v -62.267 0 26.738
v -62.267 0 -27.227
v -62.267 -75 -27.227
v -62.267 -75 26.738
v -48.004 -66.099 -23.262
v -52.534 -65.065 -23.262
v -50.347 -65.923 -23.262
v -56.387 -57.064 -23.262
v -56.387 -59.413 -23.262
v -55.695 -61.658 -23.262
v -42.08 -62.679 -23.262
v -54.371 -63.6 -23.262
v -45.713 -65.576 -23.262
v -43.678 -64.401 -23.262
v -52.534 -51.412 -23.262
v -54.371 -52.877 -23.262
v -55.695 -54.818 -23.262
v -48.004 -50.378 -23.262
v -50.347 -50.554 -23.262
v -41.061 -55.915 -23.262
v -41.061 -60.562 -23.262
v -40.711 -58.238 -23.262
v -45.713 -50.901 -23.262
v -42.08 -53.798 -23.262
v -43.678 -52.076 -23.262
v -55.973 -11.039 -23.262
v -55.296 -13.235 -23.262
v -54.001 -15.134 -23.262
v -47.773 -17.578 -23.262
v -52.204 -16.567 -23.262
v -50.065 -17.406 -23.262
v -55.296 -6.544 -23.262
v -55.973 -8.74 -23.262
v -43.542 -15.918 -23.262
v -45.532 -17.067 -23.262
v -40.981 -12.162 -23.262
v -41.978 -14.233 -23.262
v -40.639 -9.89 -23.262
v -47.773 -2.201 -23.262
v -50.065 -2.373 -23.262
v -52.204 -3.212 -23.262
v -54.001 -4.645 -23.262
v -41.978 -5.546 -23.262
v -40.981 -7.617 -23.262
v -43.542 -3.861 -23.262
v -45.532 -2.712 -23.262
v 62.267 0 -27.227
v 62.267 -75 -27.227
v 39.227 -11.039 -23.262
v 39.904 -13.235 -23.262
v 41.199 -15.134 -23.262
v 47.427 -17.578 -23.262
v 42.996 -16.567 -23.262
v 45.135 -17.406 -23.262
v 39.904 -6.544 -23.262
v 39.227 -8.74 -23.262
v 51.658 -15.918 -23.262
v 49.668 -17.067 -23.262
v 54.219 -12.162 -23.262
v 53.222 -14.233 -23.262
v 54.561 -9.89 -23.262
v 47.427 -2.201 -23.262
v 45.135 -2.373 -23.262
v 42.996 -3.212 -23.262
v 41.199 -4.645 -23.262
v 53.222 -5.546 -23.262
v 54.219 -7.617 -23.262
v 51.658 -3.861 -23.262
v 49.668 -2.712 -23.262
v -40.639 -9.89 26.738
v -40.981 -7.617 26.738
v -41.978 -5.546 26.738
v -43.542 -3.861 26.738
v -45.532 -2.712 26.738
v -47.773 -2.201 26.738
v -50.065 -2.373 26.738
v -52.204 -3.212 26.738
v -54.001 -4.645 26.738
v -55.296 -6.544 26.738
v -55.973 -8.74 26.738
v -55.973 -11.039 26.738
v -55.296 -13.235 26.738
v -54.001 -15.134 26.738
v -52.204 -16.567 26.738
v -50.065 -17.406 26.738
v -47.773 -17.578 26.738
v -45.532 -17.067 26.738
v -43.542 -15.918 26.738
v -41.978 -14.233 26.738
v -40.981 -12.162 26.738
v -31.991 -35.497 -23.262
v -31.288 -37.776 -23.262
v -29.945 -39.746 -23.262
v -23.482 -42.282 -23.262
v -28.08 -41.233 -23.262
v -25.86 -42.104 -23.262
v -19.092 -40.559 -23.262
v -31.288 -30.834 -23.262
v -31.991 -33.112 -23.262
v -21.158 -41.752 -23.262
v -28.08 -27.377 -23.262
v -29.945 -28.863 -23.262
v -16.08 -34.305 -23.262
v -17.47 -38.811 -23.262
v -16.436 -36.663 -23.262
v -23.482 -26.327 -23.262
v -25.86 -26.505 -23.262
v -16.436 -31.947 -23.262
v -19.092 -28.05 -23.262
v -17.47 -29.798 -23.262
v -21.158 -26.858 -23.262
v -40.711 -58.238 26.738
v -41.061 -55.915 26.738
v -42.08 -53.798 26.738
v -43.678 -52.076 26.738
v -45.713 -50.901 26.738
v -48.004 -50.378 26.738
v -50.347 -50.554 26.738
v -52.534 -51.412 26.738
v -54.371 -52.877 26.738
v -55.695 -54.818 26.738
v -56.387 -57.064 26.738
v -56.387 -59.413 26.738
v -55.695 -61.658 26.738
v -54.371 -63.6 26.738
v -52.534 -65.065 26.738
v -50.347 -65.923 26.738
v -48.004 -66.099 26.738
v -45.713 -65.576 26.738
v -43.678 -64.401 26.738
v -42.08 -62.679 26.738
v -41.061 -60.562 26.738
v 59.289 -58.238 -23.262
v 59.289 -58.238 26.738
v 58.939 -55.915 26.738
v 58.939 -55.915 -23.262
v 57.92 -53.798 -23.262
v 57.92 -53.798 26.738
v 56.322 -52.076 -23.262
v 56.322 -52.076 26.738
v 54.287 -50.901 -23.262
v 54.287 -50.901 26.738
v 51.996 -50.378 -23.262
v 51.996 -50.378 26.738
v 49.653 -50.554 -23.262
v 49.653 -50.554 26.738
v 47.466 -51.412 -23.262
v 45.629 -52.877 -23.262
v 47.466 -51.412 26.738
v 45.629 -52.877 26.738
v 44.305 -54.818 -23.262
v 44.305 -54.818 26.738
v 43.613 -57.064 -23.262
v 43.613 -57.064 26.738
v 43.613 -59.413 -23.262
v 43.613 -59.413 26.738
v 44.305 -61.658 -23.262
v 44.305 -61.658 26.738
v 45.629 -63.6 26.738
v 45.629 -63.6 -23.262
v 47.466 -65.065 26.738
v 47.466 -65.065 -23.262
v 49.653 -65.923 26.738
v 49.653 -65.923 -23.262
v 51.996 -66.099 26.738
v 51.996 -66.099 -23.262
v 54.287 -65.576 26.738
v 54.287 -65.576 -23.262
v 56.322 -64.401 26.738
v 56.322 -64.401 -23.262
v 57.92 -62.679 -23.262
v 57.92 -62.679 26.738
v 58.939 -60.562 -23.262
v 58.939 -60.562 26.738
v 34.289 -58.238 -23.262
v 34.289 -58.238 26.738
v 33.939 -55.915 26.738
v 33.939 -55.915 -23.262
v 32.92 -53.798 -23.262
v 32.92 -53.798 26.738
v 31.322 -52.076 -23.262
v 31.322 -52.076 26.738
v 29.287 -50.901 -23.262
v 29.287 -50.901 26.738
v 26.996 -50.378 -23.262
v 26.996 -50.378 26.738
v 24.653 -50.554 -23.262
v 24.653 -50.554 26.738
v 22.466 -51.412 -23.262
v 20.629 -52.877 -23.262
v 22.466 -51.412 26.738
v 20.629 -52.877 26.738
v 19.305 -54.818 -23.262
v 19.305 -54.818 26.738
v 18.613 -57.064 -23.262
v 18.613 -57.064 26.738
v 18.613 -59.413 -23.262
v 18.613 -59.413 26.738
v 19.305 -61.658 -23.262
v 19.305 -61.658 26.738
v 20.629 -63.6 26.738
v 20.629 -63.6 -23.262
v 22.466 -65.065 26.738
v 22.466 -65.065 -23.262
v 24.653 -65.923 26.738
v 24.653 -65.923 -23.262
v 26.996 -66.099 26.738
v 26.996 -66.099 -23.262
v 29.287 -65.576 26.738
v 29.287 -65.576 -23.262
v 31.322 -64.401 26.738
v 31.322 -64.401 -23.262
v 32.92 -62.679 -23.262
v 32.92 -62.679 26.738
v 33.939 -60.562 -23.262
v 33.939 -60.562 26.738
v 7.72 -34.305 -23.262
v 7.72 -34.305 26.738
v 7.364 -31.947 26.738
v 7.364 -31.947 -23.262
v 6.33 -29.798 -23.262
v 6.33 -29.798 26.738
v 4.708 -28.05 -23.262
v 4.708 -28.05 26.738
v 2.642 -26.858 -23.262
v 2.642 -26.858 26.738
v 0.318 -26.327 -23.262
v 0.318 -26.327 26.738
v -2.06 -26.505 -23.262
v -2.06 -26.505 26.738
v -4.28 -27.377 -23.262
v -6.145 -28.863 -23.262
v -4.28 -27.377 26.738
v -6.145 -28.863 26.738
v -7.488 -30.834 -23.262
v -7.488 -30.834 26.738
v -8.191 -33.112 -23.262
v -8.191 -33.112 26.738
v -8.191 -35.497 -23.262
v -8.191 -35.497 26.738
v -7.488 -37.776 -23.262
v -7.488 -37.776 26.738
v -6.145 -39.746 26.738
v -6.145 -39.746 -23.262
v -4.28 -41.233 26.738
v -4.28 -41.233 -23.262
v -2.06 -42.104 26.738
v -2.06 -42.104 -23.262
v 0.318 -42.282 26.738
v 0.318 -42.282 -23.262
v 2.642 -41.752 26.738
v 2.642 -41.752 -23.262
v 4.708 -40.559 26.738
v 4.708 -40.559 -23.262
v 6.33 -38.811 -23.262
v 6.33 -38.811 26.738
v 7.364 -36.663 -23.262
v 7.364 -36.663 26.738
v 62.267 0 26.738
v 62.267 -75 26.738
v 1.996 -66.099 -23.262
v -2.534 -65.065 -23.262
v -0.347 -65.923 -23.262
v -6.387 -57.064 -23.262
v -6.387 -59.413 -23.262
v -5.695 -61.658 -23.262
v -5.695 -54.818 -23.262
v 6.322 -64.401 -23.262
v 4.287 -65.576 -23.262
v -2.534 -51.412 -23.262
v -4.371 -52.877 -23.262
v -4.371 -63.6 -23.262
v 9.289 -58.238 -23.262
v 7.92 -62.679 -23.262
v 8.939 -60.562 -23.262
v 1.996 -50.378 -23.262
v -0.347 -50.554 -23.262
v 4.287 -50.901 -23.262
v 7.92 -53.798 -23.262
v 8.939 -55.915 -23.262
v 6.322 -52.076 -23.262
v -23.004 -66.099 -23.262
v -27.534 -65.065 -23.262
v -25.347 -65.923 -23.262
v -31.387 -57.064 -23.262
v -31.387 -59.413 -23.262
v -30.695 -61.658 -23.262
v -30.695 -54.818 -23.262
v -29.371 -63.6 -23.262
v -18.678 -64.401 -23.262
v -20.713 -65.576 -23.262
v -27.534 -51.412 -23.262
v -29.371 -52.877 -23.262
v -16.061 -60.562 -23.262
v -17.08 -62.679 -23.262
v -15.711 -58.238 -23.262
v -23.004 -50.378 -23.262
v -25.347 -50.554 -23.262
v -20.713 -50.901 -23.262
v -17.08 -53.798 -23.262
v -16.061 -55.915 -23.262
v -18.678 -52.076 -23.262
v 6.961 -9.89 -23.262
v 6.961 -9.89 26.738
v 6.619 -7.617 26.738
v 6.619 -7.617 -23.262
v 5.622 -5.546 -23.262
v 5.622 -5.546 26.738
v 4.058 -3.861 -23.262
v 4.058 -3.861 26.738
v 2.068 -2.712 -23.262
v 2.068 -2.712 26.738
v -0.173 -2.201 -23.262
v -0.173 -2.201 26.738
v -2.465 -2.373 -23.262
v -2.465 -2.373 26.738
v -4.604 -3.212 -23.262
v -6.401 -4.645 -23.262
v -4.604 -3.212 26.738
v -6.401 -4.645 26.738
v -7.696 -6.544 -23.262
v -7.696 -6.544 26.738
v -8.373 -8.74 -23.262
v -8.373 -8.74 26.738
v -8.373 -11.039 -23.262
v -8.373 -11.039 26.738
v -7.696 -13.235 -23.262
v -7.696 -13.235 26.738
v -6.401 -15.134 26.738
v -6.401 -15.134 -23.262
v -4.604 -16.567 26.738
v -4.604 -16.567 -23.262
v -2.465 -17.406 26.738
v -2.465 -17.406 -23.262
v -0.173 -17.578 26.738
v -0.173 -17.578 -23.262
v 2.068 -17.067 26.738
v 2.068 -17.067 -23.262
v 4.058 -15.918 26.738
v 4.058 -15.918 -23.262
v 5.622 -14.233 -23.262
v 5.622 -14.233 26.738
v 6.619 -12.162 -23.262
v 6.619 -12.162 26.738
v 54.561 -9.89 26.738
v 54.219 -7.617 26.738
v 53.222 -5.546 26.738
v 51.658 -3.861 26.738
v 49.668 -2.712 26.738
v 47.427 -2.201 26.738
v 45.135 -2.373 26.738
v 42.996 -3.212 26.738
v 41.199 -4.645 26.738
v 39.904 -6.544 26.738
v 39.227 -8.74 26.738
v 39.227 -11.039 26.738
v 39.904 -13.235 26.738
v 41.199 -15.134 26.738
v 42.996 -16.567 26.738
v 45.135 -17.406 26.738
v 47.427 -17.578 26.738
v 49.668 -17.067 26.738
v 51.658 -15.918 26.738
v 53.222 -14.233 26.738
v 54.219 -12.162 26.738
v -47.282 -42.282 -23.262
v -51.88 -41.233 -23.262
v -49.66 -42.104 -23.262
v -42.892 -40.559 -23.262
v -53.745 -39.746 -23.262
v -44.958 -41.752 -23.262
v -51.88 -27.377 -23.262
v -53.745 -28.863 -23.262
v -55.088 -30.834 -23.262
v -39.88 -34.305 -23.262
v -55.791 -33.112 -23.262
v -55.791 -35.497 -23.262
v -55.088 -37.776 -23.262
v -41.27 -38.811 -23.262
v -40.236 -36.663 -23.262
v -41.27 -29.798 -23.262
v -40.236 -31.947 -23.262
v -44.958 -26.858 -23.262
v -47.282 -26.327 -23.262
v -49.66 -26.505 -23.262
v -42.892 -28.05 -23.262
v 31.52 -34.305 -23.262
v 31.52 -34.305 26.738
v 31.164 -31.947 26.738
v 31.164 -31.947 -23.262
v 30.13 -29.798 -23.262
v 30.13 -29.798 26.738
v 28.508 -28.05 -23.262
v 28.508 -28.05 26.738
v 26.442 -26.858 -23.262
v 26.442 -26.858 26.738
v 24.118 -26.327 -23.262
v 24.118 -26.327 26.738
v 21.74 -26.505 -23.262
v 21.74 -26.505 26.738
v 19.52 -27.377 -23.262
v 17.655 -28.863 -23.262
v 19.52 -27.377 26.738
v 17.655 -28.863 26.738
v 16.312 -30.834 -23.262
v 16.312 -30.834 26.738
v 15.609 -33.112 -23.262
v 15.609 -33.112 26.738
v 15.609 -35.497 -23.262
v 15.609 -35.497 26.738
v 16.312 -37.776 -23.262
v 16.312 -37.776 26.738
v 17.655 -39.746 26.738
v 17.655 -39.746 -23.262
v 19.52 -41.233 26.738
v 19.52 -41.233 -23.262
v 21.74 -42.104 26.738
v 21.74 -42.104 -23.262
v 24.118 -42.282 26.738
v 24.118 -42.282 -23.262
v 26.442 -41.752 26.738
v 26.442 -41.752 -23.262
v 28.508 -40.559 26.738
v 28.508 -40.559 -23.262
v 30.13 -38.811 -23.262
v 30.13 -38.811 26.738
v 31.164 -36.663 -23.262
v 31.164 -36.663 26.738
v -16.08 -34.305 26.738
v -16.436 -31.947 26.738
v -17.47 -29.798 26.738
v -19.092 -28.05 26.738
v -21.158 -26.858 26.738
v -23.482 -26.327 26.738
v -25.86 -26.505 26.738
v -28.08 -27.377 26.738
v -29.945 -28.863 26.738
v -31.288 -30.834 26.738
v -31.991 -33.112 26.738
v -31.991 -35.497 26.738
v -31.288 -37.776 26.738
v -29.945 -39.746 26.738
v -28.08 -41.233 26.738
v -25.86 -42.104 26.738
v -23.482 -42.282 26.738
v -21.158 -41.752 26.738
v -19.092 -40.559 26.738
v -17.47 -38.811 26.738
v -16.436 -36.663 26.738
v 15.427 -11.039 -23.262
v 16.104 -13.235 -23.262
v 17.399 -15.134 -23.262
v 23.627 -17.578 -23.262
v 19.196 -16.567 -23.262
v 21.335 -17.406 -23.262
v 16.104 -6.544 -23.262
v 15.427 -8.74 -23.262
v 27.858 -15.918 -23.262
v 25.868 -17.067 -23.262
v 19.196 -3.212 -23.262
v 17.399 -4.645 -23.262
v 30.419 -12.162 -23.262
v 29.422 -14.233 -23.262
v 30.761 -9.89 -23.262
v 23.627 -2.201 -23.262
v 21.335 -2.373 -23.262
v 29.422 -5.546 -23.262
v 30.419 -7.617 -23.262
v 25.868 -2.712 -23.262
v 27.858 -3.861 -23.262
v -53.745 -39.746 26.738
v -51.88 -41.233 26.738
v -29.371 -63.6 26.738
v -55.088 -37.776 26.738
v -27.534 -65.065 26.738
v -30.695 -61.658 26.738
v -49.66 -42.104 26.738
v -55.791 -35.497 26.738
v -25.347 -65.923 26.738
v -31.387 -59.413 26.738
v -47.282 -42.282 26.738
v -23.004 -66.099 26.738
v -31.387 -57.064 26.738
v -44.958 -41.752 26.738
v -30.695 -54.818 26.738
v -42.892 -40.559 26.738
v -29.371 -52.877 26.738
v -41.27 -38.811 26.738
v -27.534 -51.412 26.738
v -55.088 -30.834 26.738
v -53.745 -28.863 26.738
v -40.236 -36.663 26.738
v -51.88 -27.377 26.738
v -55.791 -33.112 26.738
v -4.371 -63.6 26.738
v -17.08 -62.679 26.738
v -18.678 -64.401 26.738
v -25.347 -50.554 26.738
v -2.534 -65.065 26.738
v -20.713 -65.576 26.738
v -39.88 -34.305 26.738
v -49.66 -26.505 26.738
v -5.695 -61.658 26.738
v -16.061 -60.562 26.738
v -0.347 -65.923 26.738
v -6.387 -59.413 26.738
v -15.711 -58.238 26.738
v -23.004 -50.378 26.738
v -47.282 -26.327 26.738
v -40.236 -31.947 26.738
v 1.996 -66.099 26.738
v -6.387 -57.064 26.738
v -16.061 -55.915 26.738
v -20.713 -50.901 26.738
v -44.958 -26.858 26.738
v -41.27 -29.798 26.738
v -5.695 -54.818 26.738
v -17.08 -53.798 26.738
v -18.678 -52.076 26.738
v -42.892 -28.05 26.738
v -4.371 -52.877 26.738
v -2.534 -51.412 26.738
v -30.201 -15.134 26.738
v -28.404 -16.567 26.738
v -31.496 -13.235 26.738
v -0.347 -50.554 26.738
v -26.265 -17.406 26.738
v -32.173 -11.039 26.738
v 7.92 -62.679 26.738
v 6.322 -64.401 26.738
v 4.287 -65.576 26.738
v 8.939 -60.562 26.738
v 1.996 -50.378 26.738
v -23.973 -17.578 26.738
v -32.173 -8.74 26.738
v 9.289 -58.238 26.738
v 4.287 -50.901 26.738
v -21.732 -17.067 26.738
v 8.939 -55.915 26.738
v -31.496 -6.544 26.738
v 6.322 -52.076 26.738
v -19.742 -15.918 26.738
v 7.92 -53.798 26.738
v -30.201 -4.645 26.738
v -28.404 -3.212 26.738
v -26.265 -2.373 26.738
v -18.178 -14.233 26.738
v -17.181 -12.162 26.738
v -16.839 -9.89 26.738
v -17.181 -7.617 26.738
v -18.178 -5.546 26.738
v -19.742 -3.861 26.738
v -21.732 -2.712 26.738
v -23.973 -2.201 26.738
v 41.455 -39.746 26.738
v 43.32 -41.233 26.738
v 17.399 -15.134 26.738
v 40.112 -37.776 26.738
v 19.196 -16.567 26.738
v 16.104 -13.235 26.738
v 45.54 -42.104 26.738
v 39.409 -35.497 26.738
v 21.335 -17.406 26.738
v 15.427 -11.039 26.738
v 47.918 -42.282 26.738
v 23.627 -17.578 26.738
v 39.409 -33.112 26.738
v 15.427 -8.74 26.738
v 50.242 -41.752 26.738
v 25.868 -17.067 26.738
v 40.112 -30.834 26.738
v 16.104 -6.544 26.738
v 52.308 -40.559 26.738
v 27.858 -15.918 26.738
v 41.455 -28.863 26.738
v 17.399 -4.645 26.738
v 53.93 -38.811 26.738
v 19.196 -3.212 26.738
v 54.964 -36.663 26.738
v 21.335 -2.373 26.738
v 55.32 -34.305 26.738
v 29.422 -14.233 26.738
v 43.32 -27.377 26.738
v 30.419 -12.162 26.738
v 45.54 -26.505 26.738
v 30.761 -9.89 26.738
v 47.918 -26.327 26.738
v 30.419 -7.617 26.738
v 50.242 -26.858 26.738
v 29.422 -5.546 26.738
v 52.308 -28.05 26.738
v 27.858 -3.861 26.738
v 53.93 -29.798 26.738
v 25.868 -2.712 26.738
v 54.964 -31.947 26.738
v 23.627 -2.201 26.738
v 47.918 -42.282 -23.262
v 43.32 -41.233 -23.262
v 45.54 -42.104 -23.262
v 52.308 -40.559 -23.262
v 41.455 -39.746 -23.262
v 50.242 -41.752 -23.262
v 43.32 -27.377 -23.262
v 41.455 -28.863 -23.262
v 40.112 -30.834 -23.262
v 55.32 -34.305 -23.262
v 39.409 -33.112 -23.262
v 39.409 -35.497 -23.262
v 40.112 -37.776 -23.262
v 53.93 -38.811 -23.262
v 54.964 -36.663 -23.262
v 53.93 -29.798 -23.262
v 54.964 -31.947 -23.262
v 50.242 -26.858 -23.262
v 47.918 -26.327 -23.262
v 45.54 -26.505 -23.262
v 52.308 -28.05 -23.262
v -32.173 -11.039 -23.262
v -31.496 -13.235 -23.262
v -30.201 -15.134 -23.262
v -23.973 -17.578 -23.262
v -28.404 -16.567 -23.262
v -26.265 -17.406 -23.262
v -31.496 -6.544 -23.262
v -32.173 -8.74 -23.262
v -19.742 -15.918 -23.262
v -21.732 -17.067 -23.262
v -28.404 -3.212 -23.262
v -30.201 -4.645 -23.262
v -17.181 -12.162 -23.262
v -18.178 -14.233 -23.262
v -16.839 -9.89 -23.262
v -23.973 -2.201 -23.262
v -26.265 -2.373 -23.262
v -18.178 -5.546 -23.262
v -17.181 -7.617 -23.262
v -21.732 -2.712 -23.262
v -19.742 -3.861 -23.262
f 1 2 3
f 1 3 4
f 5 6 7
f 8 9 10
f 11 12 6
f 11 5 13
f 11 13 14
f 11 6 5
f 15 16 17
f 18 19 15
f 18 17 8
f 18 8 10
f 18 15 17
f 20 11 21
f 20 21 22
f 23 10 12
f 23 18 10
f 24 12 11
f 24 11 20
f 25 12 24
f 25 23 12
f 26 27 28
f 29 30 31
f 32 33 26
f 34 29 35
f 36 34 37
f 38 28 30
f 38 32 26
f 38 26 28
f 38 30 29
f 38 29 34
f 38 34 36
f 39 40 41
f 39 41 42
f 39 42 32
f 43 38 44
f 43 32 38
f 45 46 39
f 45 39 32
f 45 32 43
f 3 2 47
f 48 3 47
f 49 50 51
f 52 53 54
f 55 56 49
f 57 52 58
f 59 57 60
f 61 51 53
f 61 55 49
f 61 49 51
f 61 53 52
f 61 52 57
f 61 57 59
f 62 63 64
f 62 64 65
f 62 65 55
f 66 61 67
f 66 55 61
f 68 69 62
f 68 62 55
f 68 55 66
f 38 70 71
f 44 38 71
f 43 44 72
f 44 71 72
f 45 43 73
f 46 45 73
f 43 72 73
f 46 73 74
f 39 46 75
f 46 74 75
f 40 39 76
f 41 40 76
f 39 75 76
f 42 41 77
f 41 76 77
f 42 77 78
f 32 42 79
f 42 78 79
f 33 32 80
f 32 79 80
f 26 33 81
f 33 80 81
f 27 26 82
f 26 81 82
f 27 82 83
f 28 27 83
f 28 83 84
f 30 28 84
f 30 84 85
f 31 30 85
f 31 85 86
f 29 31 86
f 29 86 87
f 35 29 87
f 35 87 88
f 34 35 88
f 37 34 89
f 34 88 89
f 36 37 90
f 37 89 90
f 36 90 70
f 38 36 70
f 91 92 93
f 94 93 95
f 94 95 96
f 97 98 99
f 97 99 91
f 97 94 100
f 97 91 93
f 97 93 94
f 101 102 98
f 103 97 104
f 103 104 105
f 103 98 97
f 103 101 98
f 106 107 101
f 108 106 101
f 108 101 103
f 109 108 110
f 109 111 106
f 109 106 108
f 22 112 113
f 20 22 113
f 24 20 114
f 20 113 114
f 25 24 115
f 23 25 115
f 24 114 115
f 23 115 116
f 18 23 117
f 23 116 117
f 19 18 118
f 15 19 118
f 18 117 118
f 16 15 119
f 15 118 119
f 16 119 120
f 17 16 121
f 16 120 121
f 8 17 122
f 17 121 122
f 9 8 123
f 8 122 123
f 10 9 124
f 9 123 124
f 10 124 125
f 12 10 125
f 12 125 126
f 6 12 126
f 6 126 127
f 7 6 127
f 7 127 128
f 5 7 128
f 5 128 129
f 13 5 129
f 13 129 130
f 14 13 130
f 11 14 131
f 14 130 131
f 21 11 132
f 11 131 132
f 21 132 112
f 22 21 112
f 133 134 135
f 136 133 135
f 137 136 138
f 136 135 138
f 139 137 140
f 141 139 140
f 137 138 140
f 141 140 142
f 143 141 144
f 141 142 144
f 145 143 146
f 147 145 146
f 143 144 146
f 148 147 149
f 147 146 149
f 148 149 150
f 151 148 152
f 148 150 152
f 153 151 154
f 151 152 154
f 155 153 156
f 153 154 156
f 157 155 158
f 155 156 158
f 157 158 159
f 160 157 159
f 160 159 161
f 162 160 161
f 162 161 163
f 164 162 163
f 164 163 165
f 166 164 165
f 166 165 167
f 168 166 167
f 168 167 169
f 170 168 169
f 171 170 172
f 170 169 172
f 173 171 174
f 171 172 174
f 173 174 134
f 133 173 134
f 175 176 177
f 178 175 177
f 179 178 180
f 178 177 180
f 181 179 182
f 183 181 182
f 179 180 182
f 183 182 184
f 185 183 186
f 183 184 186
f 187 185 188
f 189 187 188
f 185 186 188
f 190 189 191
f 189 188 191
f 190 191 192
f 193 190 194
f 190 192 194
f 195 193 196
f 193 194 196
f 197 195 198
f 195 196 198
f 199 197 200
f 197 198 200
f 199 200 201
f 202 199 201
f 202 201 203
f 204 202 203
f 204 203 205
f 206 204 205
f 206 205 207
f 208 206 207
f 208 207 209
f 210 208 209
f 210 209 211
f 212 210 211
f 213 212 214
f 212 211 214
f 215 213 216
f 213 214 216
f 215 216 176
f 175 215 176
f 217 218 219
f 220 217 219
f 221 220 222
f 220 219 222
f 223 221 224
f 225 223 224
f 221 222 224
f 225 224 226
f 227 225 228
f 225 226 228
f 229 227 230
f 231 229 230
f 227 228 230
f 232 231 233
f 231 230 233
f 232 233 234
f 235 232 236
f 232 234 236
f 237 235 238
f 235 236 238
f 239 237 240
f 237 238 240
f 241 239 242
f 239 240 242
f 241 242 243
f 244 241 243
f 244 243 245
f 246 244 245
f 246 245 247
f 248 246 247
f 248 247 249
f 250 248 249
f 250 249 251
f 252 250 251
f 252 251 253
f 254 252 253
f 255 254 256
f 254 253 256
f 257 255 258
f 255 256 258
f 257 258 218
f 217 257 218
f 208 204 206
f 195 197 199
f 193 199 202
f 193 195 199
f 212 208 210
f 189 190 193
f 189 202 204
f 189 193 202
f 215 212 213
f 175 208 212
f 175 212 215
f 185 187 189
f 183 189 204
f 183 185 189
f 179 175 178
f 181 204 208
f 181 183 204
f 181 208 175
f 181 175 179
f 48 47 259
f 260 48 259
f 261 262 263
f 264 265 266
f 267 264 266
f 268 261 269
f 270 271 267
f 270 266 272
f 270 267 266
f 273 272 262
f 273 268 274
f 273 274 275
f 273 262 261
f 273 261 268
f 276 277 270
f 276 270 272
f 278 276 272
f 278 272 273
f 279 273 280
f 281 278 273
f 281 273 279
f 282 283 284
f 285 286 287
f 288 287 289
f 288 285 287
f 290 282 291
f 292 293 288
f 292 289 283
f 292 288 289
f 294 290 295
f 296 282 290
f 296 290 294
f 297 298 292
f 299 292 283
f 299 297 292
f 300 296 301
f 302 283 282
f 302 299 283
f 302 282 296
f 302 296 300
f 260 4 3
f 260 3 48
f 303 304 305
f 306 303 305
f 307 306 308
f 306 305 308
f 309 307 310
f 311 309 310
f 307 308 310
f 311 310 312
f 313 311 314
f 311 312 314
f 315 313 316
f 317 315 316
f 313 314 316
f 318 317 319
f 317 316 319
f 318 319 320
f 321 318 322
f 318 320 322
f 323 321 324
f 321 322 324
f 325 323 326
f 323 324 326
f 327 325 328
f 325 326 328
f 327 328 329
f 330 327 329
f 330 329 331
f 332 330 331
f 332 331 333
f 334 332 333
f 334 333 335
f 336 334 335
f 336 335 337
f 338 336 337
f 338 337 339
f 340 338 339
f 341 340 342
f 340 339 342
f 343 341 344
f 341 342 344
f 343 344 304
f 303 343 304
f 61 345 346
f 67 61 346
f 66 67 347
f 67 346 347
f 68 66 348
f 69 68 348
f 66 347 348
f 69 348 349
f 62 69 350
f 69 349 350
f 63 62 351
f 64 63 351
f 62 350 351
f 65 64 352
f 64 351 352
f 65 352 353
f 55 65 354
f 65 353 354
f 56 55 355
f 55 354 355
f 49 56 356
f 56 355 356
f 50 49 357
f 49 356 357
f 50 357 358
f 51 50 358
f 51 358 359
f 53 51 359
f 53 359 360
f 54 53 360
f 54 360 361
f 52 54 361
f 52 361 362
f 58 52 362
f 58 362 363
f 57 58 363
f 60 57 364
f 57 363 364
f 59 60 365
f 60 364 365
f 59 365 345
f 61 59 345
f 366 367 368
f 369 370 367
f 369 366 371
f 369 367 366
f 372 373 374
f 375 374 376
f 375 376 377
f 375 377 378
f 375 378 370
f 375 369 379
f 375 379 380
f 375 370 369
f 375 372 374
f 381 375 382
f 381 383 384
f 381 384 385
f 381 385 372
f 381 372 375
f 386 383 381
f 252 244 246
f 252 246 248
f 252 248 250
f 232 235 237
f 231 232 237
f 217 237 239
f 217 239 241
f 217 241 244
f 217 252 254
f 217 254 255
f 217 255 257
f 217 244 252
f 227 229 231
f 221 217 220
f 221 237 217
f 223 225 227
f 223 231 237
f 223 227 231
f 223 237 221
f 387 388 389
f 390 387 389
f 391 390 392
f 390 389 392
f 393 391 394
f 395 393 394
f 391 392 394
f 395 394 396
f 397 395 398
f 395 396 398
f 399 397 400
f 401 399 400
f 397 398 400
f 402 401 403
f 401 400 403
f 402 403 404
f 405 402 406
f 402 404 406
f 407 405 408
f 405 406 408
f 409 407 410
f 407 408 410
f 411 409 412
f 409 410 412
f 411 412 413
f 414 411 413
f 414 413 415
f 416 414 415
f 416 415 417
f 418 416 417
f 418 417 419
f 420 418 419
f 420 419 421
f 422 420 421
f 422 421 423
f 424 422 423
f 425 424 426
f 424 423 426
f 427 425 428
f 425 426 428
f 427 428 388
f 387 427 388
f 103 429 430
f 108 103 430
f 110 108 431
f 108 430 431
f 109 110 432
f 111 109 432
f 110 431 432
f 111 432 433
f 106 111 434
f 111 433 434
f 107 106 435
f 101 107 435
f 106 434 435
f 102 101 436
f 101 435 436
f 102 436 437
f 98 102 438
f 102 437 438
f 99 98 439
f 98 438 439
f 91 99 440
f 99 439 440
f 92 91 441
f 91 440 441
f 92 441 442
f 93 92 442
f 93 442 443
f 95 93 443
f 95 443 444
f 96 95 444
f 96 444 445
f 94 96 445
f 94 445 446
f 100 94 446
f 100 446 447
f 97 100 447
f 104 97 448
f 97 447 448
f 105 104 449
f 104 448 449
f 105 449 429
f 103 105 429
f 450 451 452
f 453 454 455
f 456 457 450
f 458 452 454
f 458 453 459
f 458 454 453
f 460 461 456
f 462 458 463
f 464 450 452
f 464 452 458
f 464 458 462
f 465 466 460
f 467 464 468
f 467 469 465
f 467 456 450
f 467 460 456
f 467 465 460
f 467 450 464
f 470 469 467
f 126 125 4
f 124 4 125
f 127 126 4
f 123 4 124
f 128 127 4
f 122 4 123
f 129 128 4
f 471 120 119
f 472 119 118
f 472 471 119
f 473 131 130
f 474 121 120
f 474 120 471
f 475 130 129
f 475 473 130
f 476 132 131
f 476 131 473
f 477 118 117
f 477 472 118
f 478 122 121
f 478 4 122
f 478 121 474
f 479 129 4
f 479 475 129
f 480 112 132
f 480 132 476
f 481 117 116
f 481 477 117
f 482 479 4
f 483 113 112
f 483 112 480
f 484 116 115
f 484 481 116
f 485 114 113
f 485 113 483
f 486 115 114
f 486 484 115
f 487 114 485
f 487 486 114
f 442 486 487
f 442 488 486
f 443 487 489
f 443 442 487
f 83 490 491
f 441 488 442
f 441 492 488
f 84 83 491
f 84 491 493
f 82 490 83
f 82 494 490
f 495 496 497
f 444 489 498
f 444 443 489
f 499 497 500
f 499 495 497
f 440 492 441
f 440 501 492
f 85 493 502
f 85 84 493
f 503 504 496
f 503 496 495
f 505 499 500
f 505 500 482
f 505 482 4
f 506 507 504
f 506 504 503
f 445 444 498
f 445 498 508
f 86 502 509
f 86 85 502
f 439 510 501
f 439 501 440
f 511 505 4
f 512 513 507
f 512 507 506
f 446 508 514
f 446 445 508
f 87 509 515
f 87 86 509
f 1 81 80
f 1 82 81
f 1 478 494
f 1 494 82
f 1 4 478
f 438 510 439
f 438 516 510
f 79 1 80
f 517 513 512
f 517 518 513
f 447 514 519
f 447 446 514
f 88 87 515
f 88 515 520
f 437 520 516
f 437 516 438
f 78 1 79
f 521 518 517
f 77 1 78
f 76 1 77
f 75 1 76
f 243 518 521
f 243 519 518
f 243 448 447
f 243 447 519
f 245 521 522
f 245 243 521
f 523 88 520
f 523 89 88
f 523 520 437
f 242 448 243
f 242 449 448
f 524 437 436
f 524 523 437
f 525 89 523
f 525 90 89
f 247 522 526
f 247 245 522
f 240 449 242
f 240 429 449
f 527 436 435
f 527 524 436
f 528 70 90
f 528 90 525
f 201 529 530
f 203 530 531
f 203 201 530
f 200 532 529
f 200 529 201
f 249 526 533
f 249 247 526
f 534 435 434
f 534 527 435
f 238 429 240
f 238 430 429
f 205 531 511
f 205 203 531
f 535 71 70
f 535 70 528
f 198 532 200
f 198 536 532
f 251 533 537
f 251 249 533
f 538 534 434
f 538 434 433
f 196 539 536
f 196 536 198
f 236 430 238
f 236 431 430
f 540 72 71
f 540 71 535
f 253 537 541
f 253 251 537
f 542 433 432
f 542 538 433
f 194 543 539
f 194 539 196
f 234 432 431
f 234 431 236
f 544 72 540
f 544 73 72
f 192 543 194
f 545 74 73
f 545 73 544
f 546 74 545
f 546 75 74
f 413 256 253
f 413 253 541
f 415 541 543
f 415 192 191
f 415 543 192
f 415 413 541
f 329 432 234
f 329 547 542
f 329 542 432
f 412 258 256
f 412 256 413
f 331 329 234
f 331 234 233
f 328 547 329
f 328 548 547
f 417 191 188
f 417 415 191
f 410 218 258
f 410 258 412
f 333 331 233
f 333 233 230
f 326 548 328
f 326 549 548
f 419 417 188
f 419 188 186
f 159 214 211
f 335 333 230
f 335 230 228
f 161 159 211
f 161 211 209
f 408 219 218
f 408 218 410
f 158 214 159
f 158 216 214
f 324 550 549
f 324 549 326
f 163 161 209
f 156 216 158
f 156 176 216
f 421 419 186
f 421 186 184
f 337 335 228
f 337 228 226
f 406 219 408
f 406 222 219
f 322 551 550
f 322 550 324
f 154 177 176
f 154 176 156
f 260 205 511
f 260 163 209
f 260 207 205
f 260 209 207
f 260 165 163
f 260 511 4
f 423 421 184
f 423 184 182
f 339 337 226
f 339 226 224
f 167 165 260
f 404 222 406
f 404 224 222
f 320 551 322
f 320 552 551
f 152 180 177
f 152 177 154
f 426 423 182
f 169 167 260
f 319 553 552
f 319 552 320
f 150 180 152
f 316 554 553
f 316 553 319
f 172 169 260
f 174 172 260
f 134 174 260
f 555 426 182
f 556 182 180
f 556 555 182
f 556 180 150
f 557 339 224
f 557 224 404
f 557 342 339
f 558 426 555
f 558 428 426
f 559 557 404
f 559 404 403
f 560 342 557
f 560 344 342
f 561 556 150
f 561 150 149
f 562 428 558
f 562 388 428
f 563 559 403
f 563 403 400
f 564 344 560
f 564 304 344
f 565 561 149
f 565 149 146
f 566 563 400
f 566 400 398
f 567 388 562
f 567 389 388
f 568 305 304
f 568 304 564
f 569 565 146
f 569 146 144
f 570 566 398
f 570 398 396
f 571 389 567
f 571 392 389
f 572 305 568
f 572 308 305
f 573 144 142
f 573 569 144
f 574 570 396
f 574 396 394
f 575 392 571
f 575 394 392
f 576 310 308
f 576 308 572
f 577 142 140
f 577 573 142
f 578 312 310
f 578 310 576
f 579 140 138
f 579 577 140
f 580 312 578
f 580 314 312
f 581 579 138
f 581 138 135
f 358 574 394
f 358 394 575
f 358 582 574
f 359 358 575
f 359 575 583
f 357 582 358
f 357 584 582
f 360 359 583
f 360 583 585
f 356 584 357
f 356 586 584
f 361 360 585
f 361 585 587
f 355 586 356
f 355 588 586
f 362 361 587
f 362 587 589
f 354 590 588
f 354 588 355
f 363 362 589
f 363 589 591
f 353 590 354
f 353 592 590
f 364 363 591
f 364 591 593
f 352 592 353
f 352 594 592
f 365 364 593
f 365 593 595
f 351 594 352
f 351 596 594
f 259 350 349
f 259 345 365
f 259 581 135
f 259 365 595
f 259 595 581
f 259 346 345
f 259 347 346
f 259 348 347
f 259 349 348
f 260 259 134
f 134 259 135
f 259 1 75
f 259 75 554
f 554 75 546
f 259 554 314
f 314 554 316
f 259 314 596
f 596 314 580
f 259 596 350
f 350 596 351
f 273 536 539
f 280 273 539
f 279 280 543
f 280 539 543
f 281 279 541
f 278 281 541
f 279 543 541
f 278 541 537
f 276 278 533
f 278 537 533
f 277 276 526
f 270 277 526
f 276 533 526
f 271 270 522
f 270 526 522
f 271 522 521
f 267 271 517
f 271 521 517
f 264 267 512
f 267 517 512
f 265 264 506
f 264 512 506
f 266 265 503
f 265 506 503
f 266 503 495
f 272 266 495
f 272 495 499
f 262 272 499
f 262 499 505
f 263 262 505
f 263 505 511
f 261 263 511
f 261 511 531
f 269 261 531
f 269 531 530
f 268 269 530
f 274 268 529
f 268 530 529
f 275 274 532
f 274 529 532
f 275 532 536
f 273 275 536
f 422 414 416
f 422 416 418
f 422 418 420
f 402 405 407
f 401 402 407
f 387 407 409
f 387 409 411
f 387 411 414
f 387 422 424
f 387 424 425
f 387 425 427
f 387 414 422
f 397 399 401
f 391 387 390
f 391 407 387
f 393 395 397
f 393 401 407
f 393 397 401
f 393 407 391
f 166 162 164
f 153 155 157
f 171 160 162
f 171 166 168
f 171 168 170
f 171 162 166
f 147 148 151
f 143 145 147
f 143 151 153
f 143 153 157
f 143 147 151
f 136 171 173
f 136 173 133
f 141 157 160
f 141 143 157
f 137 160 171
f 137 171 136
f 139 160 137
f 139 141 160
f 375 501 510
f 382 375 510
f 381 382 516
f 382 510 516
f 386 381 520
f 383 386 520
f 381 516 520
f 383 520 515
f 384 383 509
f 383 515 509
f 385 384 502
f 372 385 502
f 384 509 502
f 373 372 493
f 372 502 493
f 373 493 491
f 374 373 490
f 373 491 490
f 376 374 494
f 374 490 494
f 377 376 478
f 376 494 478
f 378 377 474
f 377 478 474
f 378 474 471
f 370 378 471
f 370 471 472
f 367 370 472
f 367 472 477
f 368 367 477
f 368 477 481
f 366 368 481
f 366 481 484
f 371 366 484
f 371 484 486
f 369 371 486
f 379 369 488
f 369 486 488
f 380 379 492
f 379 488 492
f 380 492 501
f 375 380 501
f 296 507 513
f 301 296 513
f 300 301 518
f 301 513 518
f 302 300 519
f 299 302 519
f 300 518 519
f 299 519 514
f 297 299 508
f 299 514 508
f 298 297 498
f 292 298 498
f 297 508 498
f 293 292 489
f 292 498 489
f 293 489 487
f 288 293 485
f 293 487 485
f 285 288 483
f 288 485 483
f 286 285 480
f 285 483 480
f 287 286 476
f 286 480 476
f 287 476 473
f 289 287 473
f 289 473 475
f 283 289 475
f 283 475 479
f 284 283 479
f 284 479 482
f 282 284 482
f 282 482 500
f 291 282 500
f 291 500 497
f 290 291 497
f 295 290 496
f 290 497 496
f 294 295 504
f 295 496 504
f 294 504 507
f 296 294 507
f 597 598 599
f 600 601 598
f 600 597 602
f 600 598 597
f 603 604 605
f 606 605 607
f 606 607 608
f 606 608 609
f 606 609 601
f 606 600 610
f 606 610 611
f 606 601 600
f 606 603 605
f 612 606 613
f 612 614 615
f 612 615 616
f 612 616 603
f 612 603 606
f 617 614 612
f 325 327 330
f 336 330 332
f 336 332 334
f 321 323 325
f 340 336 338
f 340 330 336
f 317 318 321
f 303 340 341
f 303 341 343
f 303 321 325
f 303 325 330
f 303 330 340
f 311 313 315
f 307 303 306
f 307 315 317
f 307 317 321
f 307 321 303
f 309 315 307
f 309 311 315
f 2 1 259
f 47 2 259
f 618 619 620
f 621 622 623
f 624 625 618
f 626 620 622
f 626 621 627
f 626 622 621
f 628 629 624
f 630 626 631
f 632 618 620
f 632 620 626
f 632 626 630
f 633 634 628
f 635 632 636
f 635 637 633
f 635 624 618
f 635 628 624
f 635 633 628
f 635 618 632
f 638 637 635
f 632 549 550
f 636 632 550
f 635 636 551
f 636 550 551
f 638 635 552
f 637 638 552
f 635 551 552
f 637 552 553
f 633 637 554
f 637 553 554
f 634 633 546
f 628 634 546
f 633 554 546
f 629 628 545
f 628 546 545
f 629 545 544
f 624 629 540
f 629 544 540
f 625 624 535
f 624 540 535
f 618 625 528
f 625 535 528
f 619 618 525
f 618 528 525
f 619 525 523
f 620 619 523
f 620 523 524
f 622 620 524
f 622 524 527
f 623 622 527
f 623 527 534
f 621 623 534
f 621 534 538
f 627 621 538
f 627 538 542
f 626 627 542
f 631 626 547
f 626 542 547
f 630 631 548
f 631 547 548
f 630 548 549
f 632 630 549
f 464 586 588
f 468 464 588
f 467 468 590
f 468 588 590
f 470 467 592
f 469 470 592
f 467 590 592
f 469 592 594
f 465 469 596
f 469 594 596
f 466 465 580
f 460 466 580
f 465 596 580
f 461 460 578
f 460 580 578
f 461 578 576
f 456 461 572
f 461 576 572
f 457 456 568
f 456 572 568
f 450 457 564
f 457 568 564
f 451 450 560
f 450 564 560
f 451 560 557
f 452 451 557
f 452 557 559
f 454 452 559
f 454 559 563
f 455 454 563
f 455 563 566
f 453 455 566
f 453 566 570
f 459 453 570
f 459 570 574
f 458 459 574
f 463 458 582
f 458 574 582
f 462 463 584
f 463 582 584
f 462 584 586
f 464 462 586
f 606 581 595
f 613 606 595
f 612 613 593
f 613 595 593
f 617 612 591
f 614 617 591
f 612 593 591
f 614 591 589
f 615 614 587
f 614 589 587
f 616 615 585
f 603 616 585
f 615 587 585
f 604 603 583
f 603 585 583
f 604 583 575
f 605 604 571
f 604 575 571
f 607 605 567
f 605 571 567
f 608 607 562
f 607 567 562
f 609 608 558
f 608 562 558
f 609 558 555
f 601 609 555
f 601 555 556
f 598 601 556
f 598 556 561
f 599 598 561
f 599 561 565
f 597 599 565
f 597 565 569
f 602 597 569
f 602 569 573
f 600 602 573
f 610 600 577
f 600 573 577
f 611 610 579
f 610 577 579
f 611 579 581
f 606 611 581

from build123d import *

# Parameters (mm, degrees)
F0_W     = 124.53489
F0_H     = 53.96512
F1_DEPTH = 75
F4_R     = 7.882332
F3_R     = 8
F2_R     = 7.71025
F5_DEPTH = 50


with BuildPart() as f1:
    # F0 (on Front) → F1 (new body)
    with BuildSketch(Plane.XZ):
        with Locations((0, -0.244186)):
            Rectangle(F0_W, F0_H)
    extrude(amount=F1_DEPTH)

    # F4 (on face) + F3 (on face) + F2 (on face) → F5 (cut)
    with BuildSketch(Plane.XY.offset(26.738374)):
        with Locations((-48.593026, -58.238372)):
            Circle(F4_R)
        with Locations((-23.593026, -58.238372)):
            Circle(F4_R)
        with Locations((1.406974, -58.238372)):
            Circle(F4_R)
        with Locations((26.406974, -58.238372)):
            Circle(F4_R)
        with Locations((51.406974, -58.238372)):
            Circle(F4_R)
    with BuildSketch(Plane.XY.offset(26.738374)):
        with Locations((-47.880299, -34.304835)):
            Circle(F3_R)
        with Locations((-24.080299, -34.304835)):
            Circle(F3_R)
        with Locations((-0.280299, -34.304835)):
            Circle(F3_R)
        with Locations((23.519701, -34.304835)):
            Circle(F3_R)
        with Locations((47.319701, -34.304835)):
            Circle(F3_R)
    with BuildSketch(Plane.XY.offset(26.738374)):
        with Locations((-48.34884, -9.889536)):
            Circle(F2_R)
        with Locations((-24.54884, -9.889536)):
            Circle(F2_R)
        with Locations((-0.74884, -9.889536)):
            Circle(F2_R)
        with Locations((23.05116, -9.889536)):
            Circle(F2_R)
        with Locations((46.85116, -9.889536)):
            Circle(F2_R)
    extrude(amount=-F5_DEPTH, mode=Mode.SUBTRACT)


solid = f1.part
